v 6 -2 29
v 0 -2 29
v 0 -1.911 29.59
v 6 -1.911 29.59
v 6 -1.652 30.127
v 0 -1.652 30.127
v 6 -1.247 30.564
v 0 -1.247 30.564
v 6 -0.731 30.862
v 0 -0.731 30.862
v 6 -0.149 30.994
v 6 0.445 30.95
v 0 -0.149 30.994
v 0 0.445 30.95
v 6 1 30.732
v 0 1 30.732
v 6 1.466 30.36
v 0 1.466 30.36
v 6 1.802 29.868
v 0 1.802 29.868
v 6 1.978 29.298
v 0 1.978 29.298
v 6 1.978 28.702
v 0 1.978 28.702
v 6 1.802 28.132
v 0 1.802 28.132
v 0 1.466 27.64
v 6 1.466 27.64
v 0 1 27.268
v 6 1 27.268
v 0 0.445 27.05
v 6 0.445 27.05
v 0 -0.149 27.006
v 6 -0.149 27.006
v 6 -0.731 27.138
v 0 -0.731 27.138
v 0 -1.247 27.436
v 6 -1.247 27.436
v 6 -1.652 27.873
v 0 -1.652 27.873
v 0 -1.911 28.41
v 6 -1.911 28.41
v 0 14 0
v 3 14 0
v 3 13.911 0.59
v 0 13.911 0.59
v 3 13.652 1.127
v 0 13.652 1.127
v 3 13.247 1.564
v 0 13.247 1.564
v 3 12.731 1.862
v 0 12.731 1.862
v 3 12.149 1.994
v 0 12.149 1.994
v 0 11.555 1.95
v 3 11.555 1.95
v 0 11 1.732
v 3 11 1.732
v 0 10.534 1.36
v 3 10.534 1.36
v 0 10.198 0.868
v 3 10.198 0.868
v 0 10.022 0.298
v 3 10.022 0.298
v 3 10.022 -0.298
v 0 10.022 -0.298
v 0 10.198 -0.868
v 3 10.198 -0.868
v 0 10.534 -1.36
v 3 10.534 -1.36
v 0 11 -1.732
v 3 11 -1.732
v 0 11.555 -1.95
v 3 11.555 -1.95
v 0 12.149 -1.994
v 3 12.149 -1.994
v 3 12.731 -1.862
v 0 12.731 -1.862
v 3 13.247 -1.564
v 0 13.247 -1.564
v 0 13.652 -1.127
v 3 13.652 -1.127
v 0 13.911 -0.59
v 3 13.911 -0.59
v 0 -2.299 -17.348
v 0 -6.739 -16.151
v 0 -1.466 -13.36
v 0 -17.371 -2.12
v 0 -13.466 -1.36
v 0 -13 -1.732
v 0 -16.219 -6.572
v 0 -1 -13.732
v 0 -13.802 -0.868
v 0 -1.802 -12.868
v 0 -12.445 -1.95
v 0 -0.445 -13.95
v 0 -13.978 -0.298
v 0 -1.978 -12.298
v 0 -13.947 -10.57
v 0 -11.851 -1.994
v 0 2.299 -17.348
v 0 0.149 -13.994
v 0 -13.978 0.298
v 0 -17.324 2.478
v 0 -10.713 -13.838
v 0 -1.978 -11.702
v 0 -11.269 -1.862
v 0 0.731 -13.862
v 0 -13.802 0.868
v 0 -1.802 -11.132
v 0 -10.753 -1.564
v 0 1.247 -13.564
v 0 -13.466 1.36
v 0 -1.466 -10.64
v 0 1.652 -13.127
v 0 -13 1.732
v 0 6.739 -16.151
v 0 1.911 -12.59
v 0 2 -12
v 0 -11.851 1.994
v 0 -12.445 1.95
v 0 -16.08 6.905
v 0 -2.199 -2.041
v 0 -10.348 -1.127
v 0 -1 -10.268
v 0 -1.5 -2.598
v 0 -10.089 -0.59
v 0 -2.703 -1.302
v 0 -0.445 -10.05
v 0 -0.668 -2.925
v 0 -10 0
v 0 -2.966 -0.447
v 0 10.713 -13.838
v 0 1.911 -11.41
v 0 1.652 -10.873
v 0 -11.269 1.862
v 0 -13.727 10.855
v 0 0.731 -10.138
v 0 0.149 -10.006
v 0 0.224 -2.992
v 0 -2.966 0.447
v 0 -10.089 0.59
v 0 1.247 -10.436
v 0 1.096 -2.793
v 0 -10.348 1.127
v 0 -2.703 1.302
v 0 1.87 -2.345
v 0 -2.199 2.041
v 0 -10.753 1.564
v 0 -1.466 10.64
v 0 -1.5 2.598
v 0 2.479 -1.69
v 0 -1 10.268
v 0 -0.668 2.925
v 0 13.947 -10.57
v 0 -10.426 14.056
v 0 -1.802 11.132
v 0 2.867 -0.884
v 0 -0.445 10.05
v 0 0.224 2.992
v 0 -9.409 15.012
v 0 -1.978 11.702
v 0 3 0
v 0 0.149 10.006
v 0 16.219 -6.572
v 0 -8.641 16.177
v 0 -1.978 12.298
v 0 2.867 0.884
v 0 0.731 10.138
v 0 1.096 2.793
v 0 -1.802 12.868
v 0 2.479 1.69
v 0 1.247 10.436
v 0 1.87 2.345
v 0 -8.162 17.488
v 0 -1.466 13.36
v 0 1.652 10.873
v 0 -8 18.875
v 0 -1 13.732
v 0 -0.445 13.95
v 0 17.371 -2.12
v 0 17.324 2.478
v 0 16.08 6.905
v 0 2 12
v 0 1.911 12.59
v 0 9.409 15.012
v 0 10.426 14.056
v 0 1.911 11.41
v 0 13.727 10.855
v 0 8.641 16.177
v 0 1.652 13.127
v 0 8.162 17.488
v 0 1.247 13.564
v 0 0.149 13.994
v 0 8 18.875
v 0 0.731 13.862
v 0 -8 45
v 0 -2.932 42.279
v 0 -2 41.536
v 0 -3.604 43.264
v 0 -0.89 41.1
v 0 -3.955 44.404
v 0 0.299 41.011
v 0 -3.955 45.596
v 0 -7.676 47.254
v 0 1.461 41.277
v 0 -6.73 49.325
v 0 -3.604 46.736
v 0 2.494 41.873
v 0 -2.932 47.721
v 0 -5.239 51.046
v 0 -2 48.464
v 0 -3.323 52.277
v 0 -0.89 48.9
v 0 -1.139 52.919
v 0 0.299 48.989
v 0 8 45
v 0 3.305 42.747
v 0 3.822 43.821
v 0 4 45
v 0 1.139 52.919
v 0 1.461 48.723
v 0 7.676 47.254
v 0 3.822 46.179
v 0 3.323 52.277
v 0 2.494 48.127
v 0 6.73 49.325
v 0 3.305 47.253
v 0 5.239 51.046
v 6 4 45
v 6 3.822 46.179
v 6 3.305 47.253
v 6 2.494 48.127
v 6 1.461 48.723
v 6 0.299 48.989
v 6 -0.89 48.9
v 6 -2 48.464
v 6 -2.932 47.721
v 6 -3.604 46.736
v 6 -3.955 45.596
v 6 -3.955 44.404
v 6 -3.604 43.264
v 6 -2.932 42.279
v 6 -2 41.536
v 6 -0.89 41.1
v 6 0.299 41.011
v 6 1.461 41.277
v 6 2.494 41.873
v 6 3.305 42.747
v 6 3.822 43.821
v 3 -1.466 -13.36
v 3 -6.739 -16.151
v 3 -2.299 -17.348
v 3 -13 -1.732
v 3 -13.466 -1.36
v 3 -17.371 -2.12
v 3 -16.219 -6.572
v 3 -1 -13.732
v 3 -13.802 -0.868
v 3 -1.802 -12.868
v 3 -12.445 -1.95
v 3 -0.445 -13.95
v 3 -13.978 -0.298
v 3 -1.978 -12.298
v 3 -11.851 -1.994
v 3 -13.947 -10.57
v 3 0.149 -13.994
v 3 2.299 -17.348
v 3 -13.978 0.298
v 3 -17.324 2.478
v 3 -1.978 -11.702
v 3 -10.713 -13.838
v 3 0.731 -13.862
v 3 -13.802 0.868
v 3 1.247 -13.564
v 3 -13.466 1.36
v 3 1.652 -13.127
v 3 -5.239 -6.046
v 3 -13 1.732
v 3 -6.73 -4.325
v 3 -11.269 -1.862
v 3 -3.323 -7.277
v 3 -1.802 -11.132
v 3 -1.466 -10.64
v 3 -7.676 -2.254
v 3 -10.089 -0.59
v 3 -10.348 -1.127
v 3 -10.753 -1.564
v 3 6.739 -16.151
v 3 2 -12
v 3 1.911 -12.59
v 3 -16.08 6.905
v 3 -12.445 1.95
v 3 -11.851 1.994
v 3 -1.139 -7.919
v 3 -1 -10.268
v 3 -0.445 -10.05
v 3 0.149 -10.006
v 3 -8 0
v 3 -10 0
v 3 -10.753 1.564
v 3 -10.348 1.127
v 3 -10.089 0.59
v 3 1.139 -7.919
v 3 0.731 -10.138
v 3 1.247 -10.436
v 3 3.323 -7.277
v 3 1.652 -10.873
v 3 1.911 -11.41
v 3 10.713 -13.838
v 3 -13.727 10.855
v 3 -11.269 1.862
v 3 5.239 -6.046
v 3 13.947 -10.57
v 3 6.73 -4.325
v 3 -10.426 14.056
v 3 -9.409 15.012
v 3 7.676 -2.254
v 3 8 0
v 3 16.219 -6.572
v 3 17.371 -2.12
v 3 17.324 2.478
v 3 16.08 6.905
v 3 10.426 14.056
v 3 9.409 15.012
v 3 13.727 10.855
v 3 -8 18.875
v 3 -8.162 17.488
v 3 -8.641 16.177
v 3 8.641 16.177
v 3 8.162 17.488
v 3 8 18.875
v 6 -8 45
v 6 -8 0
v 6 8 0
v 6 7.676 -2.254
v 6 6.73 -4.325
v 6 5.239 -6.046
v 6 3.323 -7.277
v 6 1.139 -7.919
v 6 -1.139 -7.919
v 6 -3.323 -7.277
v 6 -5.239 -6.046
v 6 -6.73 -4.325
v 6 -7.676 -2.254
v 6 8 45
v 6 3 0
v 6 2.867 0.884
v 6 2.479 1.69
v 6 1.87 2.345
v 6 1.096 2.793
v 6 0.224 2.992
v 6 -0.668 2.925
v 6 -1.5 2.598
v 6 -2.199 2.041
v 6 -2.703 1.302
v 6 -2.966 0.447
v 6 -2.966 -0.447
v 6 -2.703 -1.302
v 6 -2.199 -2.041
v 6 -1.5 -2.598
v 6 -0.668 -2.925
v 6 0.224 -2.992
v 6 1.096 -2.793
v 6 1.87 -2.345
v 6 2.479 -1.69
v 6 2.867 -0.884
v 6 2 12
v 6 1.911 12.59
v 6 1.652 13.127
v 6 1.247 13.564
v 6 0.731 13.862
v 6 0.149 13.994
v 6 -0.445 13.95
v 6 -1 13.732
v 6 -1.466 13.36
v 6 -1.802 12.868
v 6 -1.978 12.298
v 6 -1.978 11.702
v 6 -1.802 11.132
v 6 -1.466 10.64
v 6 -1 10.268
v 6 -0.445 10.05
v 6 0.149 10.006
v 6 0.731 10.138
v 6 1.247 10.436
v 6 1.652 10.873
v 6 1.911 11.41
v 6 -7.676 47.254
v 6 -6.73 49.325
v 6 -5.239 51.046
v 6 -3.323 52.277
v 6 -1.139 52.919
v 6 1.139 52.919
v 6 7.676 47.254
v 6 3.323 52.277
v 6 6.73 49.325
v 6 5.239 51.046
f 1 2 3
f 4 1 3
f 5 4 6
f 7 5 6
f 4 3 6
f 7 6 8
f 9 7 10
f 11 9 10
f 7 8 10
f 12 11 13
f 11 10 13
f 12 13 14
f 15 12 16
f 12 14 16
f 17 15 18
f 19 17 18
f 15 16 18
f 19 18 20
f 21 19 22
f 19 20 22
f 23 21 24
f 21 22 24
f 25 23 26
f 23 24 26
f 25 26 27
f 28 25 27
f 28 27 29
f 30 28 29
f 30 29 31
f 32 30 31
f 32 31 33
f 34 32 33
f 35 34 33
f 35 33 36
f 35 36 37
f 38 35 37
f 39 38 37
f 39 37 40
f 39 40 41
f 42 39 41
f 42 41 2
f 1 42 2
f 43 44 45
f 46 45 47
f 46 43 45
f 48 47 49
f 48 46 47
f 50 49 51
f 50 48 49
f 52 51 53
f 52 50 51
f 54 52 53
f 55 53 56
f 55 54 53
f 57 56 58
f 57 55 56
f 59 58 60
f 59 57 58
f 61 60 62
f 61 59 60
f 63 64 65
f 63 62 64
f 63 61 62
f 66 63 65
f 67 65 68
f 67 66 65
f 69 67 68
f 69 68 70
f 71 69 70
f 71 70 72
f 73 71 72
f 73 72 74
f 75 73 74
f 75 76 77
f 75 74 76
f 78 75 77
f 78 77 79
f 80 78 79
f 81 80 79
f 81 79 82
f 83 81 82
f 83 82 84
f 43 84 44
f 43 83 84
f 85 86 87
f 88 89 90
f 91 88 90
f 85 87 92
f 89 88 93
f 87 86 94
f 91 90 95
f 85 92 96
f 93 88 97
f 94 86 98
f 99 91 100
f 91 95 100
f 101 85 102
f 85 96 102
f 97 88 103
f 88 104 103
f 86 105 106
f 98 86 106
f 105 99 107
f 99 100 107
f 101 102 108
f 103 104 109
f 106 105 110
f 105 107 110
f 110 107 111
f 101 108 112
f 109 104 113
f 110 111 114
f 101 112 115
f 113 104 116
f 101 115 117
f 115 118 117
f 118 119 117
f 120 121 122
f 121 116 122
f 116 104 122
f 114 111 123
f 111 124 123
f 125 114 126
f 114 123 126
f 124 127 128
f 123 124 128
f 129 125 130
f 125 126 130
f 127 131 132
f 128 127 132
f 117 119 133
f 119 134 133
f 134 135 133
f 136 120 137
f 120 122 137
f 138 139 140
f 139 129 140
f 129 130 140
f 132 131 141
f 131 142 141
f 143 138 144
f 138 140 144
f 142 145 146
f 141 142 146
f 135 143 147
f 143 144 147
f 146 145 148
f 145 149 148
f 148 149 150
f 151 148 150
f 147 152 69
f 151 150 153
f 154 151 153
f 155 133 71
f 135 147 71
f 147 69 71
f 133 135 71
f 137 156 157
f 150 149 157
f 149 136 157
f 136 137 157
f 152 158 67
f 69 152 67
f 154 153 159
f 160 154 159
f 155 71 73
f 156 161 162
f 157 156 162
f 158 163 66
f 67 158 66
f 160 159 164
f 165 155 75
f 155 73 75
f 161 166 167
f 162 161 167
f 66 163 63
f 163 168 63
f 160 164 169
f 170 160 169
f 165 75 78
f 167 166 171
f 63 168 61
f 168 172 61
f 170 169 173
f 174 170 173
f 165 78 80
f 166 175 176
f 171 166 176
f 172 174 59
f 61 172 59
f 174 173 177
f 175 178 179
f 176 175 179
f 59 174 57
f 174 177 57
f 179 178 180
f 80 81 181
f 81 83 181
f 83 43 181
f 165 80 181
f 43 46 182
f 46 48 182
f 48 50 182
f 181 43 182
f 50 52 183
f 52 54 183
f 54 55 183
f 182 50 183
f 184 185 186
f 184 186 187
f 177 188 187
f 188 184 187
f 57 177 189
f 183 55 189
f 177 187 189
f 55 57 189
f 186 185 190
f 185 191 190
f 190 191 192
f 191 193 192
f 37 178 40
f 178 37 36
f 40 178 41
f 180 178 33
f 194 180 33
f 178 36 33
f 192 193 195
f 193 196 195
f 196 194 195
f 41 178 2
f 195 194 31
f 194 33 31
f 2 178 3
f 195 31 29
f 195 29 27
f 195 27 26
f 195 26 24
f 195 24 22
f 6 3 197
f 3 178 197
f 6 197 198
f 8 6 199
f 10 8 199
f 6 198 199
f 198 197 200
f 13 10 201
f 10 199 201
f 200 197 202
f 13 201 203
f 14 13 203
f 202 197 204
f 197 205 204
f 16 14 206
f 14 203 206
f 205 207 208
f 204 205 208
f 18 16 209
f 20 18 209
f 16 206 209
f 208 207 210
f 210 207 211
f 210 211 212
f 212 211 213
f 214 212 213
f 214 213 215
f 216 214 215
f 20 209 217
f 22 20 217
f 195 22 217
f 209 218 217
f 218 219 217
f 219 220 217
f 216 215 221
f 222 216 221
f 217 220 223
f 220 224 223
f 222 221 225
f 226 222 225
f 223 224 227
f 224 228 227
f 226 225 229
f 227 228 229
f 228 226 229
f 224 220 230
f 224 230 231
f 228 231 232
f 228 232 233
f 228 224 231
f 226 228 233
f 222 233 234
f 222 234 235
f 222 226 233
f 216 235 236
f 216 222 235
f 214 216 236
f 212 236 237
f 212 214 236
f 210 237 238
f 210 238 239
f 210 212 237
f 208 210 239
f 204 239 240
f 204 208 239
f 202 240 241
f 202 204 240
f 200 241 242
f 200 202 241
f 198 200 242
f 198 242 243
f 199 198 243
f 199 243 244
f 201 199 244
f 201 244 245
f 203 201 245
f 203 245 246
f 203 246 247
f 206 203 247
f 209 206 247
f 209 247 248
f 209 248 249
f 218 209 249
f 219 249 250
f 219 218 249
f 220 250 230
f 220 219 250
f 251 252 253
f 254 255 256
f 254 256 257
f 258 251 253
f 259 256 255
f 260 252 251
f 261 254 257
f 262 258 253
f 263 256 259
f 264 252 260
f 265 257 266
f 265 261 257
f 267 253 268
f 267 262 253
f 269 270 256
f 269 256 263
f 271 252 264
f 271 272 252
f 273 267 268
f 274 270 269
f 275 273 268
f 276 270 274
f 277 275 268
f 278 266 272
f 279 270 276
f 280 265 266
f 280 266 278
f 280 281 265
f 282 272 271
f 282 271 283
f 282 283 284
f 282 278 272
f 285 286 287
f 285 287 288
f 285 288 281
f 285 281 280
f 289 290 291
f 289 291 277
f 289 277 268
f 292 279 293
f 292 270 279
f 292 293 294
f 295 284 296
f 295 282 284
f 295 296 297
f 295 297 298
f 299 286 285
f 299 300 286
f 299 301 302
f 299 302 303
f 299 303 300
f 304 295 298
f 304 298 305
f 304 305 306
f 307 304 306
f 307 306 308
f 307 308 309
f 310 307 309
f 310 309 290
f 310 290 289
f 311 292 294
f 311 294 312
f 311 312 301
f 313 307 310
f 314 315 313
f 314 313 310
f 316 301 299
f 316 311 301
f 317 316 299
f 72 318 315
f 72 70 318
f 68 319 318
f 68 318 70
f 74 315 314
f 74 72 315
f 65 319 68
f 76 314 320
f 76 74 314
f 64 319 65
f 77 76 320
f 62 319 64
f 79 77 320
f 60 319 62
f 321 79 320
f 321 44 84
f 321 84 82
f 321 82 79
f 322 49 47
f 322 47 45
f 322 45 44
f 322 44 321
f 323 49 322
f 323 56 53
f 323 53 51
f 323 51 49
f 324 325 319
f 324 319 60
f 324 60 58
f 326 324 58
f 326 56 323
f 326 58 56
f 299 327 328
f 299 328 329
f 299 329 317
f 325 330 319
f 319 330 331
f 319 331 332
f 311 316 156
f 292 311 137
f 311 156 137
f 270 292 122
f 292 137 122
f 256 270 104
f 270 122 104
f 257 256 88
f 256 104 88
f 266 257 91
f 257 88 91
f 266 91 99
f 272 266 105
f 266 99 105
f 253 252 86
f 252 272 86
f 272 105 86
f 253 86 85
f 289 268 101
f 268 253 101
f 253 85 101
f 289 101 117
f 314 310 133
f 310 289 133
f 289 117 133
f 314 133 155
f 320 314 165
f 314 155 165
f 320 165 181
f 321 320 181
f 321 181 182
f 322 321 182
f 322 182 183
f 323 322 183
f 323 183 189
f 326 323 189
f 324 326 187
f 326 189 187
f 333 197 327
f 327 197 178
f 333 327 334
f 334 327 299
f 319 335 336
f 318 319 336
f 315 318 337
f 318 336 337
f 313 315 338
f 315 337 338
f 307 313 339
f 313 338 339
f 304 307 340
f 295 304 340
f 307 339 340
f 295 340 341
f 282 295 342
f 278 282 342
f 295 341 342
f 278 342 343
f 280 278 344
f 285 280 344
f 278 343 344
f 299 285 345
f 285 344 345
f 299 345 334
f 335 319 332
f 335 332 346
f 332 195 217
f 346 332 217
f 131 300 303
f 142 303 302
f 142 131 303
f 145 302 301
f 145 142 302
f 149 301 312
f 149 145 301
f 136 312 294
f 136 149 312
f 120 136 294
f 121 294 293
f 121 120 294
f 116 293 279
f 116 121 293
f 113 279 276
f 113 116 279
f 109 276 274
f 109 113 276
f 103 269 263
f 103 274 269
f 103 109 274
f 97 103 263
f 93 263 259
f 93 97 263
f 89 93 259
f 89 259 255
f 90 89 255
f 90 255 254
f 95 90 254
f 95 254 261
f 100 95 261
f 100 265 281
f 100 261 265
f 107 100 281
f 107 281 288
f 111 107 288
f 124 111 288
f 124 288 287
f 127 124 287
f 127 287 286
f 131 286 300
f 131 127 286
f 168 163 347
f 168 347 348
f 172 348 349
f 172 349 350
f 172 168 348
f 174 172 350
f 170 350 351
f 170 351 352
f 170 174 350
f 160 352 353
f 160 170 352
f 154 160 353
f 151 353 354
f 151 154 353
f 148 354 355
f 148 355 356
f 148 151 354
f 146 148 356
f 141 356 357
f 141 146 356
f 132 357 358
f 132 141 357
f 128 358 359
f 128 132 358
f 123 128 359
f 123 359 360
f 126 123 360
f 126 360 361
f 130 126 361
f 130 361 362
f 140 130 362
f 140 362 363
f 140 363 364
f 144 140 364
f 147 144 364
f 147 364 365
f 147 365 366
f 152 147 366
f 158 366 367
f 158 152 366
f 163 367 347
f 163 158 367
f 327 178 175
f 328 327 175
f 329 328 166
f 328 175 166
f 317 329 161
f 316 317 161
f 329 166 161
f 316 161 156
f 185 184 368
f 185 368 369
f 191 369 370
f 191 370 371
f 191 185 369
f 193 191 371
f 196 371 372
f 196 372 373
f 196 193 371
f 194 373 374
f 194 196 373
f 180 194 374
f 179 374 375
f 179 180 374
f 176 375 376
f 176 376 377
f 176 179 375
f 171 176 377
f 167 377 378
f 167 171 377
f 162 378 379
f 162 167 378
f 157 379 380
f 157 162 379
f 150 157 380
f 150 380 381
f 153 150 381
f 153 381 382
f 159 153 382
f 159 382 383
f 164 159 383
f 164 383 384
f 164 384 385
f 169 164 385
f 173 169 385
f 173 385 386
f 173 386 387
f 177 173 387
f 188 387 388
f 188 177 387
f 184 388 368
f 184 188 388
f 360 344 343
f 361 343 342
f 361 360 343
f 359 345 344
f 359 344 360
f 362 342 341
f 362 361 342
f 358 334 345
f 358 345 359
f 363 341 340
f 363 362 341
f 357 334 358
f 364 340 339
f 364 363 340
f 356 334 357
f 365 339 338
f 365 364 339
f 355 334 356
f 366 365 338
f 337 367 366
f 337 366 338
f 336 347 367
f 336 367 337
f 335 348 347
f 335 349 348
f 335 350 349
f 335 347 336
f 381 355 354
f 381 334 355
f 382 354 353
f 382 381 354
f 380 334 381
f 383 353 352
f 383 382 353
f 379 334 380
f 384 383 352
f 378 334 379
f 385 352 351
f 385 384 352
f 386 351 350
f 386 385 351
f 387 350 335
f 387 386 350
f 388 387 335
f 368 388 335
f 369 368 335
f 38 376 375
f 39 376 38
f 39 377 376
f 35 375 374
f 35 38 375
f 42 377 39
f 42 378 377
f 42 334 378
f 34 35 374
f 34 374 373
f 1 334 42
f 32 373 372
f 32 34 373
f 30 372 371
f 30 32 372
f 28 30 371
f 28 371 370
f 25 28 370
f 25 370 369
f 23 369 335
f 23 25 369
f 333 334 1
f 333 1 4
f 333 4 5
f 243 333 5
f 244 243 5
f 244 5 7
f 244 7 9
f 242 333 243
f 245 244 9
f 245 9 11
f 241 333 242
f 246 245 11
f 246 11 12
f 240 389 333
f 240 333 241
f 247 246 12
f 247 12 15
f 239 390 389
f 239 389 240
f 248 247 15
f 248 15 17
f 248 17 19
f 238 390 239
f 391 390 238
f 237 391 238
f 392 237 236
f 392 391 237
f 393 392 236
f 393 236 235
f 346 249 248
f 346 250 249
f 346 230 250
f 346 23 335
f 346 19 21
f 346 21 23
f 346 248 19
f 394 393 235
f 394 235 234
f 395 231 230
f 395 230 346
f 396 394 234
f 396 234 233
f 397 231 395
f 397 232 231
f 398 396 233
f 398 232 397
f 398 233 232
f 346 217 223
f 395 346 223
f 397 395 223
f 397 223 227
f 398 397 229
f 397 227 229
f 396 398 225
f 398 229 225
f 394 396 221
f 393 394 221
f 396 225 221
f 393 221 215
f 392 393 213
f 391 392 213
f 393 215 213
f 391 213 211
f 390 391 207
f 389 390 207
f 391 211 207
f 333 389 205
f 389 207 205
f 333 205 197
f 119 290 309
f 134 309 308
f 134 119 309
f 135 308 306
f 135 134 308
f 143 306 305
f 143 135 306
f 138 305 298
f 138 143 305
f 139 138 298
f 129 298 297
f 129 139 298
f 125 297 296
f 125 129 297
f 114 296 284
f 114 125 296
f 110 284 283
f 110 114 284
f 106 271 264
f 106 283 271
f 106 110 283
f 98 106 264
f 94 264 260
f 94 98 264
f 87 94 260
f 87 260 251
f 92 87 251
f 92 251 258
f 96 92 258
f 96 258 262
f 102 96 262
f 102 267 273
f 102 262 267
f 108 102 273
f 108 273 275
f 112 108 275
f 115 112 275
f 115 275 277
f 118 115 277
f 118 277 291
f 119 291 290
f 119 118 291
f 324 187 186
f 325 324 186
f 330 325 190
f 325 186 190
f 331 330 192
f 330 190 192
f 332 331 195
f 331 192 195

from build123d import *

# Parameters (mm, degrees)
F0_R     = 2
F0_R_2   = 3
F0_R_3   = 4
F1_DEPTH = 6
F2_R     = 2
F3_DEPTH = 6.001
F5_DEPTH = 3


with BuildPart() as f1:
    # F0 (on Right) → F1 (new body)
    with BuildSketch(Plane.YZ):
        with BuildLine():
            ThreePointArc((-8, 18.874586), (-8.640578, 16.177069), (-10.425532, 14.055543))
            ThreePointArc((-10.425532, 14.055543), (0, -17.5), (10.425532, 14.055543))
            ThreePointArc((10.425532, 14.055543), (8.640578, 16.177069), (8, 18.874586))
            Line((8, 18.874586), (8, 45))
            ThreePointArc((8, 45), (0, 53), (-8, 45))
            Line((-8, 45), (-8, 18.874586))
        make_face()
        with Locations((-12, 0)):
            Circle(F0_R, mode=Mode.SUBTRACT)
        with Locations((0, -12)):
            Circle(F0_R, mode=Mode.SUBTRACT)
        Circle(F0_R_2, mode=Mode.SUBTRACT)
        with Locations((0, 12)):
            Circle(F0_R, mode=Mode.SUBTRACT)
        with Locations((12, 0)):
            Circle(F0_R, mode=Mode.SUBTRACT)
        with Locations((0, 45)):
            Circle(F0_R_3, mode=Mode.SUBTRACT)
    extrude(amount=F1_DEPTH)

    # F2 (on face) → F3 (cut, through all)
    with BuildSketch(Plane(origin=(0, 0, 0), x_dir=(0, -1, 0), z_dir=(-1, 0, 0))):
        with Locations((0, 29)):
            Circle(F2_R)
    extrude(amount=-F3_DEPTH, mode=Mode.SUBTRACT)

    # F4 (on face) → F5 (cut)
    with BuildSketch(Plane.YZ.offset(6)):
        with BuildLine():
            Line((-8, 0), (-8, 18.874586))
            ThreePointArc((-8, 18.874586), (0, -20.5), (8, 18.874586))
            Line((8, 18.874586), (8, 0))
            ThreePointArc((8, 0), (0, -8), (-8, 0))
        make_face()
    extrude(amount=-F5_DEPTH, mode=Mode.SUBTRACT)


solid = f1.part
